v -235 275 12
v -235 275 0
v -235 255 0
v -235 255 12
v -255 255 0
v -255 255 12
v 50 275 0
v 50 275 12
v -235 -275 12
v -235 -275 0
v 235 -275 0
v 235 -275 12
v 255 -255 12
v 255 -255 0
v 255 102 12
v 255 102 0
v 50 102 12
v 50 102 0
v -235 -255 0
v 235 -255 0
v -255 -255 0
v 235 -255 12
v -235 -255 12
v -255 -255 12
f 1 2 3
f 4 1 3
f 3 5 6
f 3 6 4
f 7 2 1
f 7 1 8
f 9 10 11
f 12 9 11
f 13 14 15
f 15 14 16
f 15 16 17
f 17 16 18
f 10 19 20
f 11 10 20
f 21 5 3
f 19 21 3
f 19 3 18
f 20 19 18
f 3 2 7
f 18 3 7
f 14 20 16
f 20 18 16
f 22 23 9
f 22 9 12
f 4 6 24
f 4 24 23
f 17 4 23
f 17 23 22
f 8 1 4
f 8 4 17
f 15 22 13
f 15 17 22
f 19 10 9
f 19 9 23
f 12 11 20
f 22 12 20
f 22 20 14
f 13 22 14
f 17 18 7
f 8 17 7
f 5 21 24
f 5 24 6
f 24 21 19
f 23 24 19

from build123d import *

# Parameters (mm, degrees)
SKETCH_1_W          = 470
SKETCH_1_H          = 510
SKETCH_1_H_2        = 20
SKETCH_1_W_2        = 20
EXTRUDE_1_DEPTH     = 12
SKETCH_2_W          = 185
SKETCH_2_H          = 153
SKETCH_2_W_2        = 20
SKETCH_2_H_2        = 20
CUT_EXTRUDE_1_DEPTH = 12


with BuildPart() as part:
    # ｽｹｯﾁ1 → ﾎﾞｽ - 押し出し1 (new body)
    with BuildSketch(Plane.XY):
        Rectangle(SKETCH_1_W, SKETCH_1_H)
        with Locations((0, 265)):
            Rectangle(SKETCH_1_W, SKETCH_1_H_2)
        with Locations((-245, 0)):
            Rectangle(SKETCH_1_W_2, SKETCH_1_H)
        with Locations((245, 0)):
            Rectangle(SKETCH_1_W_2, SKETCH_1_H)
        with Locations((0, -265)):
            Rectangle(SKETCH_1_W, SKETCH_1_H_2)
    extrude(amount=EXTRUDE_1_DEPTH)

    # ｽｹｯﾁ2 → ｶｯﾄ - 押し出し1 (cut)
    with BuildSketch(Plane(origin=(0, 0, 0), x_dir=(-1, 0, 0), z_dir=(0, 0, -1))):
        Polygon((-255, 255), (-235, 255), (-235, 275), (-50, 275), (-50, 308.587411224), (-364.697292758, 308.587411224), (-364.697292758, 102), (-255, 102), align=None)
        with Locations((-142.5, 178.5)):
            Rectangle(SKETCH_2_W, SKETCH_2_H)
        with Locations((-245, 178.5)):
            Rectangle(SKETCH_2_W_2, SKETCH_2_H)
        with Locations((-142.5, 265)):
            Rectangle(SKETCH_2_W, SKETCH_2_H_2)
    extrude(amount=-CUT_EXTRUDE_1_DEPTH, mode=Mode.SUBTRACT)


solid = part.part
